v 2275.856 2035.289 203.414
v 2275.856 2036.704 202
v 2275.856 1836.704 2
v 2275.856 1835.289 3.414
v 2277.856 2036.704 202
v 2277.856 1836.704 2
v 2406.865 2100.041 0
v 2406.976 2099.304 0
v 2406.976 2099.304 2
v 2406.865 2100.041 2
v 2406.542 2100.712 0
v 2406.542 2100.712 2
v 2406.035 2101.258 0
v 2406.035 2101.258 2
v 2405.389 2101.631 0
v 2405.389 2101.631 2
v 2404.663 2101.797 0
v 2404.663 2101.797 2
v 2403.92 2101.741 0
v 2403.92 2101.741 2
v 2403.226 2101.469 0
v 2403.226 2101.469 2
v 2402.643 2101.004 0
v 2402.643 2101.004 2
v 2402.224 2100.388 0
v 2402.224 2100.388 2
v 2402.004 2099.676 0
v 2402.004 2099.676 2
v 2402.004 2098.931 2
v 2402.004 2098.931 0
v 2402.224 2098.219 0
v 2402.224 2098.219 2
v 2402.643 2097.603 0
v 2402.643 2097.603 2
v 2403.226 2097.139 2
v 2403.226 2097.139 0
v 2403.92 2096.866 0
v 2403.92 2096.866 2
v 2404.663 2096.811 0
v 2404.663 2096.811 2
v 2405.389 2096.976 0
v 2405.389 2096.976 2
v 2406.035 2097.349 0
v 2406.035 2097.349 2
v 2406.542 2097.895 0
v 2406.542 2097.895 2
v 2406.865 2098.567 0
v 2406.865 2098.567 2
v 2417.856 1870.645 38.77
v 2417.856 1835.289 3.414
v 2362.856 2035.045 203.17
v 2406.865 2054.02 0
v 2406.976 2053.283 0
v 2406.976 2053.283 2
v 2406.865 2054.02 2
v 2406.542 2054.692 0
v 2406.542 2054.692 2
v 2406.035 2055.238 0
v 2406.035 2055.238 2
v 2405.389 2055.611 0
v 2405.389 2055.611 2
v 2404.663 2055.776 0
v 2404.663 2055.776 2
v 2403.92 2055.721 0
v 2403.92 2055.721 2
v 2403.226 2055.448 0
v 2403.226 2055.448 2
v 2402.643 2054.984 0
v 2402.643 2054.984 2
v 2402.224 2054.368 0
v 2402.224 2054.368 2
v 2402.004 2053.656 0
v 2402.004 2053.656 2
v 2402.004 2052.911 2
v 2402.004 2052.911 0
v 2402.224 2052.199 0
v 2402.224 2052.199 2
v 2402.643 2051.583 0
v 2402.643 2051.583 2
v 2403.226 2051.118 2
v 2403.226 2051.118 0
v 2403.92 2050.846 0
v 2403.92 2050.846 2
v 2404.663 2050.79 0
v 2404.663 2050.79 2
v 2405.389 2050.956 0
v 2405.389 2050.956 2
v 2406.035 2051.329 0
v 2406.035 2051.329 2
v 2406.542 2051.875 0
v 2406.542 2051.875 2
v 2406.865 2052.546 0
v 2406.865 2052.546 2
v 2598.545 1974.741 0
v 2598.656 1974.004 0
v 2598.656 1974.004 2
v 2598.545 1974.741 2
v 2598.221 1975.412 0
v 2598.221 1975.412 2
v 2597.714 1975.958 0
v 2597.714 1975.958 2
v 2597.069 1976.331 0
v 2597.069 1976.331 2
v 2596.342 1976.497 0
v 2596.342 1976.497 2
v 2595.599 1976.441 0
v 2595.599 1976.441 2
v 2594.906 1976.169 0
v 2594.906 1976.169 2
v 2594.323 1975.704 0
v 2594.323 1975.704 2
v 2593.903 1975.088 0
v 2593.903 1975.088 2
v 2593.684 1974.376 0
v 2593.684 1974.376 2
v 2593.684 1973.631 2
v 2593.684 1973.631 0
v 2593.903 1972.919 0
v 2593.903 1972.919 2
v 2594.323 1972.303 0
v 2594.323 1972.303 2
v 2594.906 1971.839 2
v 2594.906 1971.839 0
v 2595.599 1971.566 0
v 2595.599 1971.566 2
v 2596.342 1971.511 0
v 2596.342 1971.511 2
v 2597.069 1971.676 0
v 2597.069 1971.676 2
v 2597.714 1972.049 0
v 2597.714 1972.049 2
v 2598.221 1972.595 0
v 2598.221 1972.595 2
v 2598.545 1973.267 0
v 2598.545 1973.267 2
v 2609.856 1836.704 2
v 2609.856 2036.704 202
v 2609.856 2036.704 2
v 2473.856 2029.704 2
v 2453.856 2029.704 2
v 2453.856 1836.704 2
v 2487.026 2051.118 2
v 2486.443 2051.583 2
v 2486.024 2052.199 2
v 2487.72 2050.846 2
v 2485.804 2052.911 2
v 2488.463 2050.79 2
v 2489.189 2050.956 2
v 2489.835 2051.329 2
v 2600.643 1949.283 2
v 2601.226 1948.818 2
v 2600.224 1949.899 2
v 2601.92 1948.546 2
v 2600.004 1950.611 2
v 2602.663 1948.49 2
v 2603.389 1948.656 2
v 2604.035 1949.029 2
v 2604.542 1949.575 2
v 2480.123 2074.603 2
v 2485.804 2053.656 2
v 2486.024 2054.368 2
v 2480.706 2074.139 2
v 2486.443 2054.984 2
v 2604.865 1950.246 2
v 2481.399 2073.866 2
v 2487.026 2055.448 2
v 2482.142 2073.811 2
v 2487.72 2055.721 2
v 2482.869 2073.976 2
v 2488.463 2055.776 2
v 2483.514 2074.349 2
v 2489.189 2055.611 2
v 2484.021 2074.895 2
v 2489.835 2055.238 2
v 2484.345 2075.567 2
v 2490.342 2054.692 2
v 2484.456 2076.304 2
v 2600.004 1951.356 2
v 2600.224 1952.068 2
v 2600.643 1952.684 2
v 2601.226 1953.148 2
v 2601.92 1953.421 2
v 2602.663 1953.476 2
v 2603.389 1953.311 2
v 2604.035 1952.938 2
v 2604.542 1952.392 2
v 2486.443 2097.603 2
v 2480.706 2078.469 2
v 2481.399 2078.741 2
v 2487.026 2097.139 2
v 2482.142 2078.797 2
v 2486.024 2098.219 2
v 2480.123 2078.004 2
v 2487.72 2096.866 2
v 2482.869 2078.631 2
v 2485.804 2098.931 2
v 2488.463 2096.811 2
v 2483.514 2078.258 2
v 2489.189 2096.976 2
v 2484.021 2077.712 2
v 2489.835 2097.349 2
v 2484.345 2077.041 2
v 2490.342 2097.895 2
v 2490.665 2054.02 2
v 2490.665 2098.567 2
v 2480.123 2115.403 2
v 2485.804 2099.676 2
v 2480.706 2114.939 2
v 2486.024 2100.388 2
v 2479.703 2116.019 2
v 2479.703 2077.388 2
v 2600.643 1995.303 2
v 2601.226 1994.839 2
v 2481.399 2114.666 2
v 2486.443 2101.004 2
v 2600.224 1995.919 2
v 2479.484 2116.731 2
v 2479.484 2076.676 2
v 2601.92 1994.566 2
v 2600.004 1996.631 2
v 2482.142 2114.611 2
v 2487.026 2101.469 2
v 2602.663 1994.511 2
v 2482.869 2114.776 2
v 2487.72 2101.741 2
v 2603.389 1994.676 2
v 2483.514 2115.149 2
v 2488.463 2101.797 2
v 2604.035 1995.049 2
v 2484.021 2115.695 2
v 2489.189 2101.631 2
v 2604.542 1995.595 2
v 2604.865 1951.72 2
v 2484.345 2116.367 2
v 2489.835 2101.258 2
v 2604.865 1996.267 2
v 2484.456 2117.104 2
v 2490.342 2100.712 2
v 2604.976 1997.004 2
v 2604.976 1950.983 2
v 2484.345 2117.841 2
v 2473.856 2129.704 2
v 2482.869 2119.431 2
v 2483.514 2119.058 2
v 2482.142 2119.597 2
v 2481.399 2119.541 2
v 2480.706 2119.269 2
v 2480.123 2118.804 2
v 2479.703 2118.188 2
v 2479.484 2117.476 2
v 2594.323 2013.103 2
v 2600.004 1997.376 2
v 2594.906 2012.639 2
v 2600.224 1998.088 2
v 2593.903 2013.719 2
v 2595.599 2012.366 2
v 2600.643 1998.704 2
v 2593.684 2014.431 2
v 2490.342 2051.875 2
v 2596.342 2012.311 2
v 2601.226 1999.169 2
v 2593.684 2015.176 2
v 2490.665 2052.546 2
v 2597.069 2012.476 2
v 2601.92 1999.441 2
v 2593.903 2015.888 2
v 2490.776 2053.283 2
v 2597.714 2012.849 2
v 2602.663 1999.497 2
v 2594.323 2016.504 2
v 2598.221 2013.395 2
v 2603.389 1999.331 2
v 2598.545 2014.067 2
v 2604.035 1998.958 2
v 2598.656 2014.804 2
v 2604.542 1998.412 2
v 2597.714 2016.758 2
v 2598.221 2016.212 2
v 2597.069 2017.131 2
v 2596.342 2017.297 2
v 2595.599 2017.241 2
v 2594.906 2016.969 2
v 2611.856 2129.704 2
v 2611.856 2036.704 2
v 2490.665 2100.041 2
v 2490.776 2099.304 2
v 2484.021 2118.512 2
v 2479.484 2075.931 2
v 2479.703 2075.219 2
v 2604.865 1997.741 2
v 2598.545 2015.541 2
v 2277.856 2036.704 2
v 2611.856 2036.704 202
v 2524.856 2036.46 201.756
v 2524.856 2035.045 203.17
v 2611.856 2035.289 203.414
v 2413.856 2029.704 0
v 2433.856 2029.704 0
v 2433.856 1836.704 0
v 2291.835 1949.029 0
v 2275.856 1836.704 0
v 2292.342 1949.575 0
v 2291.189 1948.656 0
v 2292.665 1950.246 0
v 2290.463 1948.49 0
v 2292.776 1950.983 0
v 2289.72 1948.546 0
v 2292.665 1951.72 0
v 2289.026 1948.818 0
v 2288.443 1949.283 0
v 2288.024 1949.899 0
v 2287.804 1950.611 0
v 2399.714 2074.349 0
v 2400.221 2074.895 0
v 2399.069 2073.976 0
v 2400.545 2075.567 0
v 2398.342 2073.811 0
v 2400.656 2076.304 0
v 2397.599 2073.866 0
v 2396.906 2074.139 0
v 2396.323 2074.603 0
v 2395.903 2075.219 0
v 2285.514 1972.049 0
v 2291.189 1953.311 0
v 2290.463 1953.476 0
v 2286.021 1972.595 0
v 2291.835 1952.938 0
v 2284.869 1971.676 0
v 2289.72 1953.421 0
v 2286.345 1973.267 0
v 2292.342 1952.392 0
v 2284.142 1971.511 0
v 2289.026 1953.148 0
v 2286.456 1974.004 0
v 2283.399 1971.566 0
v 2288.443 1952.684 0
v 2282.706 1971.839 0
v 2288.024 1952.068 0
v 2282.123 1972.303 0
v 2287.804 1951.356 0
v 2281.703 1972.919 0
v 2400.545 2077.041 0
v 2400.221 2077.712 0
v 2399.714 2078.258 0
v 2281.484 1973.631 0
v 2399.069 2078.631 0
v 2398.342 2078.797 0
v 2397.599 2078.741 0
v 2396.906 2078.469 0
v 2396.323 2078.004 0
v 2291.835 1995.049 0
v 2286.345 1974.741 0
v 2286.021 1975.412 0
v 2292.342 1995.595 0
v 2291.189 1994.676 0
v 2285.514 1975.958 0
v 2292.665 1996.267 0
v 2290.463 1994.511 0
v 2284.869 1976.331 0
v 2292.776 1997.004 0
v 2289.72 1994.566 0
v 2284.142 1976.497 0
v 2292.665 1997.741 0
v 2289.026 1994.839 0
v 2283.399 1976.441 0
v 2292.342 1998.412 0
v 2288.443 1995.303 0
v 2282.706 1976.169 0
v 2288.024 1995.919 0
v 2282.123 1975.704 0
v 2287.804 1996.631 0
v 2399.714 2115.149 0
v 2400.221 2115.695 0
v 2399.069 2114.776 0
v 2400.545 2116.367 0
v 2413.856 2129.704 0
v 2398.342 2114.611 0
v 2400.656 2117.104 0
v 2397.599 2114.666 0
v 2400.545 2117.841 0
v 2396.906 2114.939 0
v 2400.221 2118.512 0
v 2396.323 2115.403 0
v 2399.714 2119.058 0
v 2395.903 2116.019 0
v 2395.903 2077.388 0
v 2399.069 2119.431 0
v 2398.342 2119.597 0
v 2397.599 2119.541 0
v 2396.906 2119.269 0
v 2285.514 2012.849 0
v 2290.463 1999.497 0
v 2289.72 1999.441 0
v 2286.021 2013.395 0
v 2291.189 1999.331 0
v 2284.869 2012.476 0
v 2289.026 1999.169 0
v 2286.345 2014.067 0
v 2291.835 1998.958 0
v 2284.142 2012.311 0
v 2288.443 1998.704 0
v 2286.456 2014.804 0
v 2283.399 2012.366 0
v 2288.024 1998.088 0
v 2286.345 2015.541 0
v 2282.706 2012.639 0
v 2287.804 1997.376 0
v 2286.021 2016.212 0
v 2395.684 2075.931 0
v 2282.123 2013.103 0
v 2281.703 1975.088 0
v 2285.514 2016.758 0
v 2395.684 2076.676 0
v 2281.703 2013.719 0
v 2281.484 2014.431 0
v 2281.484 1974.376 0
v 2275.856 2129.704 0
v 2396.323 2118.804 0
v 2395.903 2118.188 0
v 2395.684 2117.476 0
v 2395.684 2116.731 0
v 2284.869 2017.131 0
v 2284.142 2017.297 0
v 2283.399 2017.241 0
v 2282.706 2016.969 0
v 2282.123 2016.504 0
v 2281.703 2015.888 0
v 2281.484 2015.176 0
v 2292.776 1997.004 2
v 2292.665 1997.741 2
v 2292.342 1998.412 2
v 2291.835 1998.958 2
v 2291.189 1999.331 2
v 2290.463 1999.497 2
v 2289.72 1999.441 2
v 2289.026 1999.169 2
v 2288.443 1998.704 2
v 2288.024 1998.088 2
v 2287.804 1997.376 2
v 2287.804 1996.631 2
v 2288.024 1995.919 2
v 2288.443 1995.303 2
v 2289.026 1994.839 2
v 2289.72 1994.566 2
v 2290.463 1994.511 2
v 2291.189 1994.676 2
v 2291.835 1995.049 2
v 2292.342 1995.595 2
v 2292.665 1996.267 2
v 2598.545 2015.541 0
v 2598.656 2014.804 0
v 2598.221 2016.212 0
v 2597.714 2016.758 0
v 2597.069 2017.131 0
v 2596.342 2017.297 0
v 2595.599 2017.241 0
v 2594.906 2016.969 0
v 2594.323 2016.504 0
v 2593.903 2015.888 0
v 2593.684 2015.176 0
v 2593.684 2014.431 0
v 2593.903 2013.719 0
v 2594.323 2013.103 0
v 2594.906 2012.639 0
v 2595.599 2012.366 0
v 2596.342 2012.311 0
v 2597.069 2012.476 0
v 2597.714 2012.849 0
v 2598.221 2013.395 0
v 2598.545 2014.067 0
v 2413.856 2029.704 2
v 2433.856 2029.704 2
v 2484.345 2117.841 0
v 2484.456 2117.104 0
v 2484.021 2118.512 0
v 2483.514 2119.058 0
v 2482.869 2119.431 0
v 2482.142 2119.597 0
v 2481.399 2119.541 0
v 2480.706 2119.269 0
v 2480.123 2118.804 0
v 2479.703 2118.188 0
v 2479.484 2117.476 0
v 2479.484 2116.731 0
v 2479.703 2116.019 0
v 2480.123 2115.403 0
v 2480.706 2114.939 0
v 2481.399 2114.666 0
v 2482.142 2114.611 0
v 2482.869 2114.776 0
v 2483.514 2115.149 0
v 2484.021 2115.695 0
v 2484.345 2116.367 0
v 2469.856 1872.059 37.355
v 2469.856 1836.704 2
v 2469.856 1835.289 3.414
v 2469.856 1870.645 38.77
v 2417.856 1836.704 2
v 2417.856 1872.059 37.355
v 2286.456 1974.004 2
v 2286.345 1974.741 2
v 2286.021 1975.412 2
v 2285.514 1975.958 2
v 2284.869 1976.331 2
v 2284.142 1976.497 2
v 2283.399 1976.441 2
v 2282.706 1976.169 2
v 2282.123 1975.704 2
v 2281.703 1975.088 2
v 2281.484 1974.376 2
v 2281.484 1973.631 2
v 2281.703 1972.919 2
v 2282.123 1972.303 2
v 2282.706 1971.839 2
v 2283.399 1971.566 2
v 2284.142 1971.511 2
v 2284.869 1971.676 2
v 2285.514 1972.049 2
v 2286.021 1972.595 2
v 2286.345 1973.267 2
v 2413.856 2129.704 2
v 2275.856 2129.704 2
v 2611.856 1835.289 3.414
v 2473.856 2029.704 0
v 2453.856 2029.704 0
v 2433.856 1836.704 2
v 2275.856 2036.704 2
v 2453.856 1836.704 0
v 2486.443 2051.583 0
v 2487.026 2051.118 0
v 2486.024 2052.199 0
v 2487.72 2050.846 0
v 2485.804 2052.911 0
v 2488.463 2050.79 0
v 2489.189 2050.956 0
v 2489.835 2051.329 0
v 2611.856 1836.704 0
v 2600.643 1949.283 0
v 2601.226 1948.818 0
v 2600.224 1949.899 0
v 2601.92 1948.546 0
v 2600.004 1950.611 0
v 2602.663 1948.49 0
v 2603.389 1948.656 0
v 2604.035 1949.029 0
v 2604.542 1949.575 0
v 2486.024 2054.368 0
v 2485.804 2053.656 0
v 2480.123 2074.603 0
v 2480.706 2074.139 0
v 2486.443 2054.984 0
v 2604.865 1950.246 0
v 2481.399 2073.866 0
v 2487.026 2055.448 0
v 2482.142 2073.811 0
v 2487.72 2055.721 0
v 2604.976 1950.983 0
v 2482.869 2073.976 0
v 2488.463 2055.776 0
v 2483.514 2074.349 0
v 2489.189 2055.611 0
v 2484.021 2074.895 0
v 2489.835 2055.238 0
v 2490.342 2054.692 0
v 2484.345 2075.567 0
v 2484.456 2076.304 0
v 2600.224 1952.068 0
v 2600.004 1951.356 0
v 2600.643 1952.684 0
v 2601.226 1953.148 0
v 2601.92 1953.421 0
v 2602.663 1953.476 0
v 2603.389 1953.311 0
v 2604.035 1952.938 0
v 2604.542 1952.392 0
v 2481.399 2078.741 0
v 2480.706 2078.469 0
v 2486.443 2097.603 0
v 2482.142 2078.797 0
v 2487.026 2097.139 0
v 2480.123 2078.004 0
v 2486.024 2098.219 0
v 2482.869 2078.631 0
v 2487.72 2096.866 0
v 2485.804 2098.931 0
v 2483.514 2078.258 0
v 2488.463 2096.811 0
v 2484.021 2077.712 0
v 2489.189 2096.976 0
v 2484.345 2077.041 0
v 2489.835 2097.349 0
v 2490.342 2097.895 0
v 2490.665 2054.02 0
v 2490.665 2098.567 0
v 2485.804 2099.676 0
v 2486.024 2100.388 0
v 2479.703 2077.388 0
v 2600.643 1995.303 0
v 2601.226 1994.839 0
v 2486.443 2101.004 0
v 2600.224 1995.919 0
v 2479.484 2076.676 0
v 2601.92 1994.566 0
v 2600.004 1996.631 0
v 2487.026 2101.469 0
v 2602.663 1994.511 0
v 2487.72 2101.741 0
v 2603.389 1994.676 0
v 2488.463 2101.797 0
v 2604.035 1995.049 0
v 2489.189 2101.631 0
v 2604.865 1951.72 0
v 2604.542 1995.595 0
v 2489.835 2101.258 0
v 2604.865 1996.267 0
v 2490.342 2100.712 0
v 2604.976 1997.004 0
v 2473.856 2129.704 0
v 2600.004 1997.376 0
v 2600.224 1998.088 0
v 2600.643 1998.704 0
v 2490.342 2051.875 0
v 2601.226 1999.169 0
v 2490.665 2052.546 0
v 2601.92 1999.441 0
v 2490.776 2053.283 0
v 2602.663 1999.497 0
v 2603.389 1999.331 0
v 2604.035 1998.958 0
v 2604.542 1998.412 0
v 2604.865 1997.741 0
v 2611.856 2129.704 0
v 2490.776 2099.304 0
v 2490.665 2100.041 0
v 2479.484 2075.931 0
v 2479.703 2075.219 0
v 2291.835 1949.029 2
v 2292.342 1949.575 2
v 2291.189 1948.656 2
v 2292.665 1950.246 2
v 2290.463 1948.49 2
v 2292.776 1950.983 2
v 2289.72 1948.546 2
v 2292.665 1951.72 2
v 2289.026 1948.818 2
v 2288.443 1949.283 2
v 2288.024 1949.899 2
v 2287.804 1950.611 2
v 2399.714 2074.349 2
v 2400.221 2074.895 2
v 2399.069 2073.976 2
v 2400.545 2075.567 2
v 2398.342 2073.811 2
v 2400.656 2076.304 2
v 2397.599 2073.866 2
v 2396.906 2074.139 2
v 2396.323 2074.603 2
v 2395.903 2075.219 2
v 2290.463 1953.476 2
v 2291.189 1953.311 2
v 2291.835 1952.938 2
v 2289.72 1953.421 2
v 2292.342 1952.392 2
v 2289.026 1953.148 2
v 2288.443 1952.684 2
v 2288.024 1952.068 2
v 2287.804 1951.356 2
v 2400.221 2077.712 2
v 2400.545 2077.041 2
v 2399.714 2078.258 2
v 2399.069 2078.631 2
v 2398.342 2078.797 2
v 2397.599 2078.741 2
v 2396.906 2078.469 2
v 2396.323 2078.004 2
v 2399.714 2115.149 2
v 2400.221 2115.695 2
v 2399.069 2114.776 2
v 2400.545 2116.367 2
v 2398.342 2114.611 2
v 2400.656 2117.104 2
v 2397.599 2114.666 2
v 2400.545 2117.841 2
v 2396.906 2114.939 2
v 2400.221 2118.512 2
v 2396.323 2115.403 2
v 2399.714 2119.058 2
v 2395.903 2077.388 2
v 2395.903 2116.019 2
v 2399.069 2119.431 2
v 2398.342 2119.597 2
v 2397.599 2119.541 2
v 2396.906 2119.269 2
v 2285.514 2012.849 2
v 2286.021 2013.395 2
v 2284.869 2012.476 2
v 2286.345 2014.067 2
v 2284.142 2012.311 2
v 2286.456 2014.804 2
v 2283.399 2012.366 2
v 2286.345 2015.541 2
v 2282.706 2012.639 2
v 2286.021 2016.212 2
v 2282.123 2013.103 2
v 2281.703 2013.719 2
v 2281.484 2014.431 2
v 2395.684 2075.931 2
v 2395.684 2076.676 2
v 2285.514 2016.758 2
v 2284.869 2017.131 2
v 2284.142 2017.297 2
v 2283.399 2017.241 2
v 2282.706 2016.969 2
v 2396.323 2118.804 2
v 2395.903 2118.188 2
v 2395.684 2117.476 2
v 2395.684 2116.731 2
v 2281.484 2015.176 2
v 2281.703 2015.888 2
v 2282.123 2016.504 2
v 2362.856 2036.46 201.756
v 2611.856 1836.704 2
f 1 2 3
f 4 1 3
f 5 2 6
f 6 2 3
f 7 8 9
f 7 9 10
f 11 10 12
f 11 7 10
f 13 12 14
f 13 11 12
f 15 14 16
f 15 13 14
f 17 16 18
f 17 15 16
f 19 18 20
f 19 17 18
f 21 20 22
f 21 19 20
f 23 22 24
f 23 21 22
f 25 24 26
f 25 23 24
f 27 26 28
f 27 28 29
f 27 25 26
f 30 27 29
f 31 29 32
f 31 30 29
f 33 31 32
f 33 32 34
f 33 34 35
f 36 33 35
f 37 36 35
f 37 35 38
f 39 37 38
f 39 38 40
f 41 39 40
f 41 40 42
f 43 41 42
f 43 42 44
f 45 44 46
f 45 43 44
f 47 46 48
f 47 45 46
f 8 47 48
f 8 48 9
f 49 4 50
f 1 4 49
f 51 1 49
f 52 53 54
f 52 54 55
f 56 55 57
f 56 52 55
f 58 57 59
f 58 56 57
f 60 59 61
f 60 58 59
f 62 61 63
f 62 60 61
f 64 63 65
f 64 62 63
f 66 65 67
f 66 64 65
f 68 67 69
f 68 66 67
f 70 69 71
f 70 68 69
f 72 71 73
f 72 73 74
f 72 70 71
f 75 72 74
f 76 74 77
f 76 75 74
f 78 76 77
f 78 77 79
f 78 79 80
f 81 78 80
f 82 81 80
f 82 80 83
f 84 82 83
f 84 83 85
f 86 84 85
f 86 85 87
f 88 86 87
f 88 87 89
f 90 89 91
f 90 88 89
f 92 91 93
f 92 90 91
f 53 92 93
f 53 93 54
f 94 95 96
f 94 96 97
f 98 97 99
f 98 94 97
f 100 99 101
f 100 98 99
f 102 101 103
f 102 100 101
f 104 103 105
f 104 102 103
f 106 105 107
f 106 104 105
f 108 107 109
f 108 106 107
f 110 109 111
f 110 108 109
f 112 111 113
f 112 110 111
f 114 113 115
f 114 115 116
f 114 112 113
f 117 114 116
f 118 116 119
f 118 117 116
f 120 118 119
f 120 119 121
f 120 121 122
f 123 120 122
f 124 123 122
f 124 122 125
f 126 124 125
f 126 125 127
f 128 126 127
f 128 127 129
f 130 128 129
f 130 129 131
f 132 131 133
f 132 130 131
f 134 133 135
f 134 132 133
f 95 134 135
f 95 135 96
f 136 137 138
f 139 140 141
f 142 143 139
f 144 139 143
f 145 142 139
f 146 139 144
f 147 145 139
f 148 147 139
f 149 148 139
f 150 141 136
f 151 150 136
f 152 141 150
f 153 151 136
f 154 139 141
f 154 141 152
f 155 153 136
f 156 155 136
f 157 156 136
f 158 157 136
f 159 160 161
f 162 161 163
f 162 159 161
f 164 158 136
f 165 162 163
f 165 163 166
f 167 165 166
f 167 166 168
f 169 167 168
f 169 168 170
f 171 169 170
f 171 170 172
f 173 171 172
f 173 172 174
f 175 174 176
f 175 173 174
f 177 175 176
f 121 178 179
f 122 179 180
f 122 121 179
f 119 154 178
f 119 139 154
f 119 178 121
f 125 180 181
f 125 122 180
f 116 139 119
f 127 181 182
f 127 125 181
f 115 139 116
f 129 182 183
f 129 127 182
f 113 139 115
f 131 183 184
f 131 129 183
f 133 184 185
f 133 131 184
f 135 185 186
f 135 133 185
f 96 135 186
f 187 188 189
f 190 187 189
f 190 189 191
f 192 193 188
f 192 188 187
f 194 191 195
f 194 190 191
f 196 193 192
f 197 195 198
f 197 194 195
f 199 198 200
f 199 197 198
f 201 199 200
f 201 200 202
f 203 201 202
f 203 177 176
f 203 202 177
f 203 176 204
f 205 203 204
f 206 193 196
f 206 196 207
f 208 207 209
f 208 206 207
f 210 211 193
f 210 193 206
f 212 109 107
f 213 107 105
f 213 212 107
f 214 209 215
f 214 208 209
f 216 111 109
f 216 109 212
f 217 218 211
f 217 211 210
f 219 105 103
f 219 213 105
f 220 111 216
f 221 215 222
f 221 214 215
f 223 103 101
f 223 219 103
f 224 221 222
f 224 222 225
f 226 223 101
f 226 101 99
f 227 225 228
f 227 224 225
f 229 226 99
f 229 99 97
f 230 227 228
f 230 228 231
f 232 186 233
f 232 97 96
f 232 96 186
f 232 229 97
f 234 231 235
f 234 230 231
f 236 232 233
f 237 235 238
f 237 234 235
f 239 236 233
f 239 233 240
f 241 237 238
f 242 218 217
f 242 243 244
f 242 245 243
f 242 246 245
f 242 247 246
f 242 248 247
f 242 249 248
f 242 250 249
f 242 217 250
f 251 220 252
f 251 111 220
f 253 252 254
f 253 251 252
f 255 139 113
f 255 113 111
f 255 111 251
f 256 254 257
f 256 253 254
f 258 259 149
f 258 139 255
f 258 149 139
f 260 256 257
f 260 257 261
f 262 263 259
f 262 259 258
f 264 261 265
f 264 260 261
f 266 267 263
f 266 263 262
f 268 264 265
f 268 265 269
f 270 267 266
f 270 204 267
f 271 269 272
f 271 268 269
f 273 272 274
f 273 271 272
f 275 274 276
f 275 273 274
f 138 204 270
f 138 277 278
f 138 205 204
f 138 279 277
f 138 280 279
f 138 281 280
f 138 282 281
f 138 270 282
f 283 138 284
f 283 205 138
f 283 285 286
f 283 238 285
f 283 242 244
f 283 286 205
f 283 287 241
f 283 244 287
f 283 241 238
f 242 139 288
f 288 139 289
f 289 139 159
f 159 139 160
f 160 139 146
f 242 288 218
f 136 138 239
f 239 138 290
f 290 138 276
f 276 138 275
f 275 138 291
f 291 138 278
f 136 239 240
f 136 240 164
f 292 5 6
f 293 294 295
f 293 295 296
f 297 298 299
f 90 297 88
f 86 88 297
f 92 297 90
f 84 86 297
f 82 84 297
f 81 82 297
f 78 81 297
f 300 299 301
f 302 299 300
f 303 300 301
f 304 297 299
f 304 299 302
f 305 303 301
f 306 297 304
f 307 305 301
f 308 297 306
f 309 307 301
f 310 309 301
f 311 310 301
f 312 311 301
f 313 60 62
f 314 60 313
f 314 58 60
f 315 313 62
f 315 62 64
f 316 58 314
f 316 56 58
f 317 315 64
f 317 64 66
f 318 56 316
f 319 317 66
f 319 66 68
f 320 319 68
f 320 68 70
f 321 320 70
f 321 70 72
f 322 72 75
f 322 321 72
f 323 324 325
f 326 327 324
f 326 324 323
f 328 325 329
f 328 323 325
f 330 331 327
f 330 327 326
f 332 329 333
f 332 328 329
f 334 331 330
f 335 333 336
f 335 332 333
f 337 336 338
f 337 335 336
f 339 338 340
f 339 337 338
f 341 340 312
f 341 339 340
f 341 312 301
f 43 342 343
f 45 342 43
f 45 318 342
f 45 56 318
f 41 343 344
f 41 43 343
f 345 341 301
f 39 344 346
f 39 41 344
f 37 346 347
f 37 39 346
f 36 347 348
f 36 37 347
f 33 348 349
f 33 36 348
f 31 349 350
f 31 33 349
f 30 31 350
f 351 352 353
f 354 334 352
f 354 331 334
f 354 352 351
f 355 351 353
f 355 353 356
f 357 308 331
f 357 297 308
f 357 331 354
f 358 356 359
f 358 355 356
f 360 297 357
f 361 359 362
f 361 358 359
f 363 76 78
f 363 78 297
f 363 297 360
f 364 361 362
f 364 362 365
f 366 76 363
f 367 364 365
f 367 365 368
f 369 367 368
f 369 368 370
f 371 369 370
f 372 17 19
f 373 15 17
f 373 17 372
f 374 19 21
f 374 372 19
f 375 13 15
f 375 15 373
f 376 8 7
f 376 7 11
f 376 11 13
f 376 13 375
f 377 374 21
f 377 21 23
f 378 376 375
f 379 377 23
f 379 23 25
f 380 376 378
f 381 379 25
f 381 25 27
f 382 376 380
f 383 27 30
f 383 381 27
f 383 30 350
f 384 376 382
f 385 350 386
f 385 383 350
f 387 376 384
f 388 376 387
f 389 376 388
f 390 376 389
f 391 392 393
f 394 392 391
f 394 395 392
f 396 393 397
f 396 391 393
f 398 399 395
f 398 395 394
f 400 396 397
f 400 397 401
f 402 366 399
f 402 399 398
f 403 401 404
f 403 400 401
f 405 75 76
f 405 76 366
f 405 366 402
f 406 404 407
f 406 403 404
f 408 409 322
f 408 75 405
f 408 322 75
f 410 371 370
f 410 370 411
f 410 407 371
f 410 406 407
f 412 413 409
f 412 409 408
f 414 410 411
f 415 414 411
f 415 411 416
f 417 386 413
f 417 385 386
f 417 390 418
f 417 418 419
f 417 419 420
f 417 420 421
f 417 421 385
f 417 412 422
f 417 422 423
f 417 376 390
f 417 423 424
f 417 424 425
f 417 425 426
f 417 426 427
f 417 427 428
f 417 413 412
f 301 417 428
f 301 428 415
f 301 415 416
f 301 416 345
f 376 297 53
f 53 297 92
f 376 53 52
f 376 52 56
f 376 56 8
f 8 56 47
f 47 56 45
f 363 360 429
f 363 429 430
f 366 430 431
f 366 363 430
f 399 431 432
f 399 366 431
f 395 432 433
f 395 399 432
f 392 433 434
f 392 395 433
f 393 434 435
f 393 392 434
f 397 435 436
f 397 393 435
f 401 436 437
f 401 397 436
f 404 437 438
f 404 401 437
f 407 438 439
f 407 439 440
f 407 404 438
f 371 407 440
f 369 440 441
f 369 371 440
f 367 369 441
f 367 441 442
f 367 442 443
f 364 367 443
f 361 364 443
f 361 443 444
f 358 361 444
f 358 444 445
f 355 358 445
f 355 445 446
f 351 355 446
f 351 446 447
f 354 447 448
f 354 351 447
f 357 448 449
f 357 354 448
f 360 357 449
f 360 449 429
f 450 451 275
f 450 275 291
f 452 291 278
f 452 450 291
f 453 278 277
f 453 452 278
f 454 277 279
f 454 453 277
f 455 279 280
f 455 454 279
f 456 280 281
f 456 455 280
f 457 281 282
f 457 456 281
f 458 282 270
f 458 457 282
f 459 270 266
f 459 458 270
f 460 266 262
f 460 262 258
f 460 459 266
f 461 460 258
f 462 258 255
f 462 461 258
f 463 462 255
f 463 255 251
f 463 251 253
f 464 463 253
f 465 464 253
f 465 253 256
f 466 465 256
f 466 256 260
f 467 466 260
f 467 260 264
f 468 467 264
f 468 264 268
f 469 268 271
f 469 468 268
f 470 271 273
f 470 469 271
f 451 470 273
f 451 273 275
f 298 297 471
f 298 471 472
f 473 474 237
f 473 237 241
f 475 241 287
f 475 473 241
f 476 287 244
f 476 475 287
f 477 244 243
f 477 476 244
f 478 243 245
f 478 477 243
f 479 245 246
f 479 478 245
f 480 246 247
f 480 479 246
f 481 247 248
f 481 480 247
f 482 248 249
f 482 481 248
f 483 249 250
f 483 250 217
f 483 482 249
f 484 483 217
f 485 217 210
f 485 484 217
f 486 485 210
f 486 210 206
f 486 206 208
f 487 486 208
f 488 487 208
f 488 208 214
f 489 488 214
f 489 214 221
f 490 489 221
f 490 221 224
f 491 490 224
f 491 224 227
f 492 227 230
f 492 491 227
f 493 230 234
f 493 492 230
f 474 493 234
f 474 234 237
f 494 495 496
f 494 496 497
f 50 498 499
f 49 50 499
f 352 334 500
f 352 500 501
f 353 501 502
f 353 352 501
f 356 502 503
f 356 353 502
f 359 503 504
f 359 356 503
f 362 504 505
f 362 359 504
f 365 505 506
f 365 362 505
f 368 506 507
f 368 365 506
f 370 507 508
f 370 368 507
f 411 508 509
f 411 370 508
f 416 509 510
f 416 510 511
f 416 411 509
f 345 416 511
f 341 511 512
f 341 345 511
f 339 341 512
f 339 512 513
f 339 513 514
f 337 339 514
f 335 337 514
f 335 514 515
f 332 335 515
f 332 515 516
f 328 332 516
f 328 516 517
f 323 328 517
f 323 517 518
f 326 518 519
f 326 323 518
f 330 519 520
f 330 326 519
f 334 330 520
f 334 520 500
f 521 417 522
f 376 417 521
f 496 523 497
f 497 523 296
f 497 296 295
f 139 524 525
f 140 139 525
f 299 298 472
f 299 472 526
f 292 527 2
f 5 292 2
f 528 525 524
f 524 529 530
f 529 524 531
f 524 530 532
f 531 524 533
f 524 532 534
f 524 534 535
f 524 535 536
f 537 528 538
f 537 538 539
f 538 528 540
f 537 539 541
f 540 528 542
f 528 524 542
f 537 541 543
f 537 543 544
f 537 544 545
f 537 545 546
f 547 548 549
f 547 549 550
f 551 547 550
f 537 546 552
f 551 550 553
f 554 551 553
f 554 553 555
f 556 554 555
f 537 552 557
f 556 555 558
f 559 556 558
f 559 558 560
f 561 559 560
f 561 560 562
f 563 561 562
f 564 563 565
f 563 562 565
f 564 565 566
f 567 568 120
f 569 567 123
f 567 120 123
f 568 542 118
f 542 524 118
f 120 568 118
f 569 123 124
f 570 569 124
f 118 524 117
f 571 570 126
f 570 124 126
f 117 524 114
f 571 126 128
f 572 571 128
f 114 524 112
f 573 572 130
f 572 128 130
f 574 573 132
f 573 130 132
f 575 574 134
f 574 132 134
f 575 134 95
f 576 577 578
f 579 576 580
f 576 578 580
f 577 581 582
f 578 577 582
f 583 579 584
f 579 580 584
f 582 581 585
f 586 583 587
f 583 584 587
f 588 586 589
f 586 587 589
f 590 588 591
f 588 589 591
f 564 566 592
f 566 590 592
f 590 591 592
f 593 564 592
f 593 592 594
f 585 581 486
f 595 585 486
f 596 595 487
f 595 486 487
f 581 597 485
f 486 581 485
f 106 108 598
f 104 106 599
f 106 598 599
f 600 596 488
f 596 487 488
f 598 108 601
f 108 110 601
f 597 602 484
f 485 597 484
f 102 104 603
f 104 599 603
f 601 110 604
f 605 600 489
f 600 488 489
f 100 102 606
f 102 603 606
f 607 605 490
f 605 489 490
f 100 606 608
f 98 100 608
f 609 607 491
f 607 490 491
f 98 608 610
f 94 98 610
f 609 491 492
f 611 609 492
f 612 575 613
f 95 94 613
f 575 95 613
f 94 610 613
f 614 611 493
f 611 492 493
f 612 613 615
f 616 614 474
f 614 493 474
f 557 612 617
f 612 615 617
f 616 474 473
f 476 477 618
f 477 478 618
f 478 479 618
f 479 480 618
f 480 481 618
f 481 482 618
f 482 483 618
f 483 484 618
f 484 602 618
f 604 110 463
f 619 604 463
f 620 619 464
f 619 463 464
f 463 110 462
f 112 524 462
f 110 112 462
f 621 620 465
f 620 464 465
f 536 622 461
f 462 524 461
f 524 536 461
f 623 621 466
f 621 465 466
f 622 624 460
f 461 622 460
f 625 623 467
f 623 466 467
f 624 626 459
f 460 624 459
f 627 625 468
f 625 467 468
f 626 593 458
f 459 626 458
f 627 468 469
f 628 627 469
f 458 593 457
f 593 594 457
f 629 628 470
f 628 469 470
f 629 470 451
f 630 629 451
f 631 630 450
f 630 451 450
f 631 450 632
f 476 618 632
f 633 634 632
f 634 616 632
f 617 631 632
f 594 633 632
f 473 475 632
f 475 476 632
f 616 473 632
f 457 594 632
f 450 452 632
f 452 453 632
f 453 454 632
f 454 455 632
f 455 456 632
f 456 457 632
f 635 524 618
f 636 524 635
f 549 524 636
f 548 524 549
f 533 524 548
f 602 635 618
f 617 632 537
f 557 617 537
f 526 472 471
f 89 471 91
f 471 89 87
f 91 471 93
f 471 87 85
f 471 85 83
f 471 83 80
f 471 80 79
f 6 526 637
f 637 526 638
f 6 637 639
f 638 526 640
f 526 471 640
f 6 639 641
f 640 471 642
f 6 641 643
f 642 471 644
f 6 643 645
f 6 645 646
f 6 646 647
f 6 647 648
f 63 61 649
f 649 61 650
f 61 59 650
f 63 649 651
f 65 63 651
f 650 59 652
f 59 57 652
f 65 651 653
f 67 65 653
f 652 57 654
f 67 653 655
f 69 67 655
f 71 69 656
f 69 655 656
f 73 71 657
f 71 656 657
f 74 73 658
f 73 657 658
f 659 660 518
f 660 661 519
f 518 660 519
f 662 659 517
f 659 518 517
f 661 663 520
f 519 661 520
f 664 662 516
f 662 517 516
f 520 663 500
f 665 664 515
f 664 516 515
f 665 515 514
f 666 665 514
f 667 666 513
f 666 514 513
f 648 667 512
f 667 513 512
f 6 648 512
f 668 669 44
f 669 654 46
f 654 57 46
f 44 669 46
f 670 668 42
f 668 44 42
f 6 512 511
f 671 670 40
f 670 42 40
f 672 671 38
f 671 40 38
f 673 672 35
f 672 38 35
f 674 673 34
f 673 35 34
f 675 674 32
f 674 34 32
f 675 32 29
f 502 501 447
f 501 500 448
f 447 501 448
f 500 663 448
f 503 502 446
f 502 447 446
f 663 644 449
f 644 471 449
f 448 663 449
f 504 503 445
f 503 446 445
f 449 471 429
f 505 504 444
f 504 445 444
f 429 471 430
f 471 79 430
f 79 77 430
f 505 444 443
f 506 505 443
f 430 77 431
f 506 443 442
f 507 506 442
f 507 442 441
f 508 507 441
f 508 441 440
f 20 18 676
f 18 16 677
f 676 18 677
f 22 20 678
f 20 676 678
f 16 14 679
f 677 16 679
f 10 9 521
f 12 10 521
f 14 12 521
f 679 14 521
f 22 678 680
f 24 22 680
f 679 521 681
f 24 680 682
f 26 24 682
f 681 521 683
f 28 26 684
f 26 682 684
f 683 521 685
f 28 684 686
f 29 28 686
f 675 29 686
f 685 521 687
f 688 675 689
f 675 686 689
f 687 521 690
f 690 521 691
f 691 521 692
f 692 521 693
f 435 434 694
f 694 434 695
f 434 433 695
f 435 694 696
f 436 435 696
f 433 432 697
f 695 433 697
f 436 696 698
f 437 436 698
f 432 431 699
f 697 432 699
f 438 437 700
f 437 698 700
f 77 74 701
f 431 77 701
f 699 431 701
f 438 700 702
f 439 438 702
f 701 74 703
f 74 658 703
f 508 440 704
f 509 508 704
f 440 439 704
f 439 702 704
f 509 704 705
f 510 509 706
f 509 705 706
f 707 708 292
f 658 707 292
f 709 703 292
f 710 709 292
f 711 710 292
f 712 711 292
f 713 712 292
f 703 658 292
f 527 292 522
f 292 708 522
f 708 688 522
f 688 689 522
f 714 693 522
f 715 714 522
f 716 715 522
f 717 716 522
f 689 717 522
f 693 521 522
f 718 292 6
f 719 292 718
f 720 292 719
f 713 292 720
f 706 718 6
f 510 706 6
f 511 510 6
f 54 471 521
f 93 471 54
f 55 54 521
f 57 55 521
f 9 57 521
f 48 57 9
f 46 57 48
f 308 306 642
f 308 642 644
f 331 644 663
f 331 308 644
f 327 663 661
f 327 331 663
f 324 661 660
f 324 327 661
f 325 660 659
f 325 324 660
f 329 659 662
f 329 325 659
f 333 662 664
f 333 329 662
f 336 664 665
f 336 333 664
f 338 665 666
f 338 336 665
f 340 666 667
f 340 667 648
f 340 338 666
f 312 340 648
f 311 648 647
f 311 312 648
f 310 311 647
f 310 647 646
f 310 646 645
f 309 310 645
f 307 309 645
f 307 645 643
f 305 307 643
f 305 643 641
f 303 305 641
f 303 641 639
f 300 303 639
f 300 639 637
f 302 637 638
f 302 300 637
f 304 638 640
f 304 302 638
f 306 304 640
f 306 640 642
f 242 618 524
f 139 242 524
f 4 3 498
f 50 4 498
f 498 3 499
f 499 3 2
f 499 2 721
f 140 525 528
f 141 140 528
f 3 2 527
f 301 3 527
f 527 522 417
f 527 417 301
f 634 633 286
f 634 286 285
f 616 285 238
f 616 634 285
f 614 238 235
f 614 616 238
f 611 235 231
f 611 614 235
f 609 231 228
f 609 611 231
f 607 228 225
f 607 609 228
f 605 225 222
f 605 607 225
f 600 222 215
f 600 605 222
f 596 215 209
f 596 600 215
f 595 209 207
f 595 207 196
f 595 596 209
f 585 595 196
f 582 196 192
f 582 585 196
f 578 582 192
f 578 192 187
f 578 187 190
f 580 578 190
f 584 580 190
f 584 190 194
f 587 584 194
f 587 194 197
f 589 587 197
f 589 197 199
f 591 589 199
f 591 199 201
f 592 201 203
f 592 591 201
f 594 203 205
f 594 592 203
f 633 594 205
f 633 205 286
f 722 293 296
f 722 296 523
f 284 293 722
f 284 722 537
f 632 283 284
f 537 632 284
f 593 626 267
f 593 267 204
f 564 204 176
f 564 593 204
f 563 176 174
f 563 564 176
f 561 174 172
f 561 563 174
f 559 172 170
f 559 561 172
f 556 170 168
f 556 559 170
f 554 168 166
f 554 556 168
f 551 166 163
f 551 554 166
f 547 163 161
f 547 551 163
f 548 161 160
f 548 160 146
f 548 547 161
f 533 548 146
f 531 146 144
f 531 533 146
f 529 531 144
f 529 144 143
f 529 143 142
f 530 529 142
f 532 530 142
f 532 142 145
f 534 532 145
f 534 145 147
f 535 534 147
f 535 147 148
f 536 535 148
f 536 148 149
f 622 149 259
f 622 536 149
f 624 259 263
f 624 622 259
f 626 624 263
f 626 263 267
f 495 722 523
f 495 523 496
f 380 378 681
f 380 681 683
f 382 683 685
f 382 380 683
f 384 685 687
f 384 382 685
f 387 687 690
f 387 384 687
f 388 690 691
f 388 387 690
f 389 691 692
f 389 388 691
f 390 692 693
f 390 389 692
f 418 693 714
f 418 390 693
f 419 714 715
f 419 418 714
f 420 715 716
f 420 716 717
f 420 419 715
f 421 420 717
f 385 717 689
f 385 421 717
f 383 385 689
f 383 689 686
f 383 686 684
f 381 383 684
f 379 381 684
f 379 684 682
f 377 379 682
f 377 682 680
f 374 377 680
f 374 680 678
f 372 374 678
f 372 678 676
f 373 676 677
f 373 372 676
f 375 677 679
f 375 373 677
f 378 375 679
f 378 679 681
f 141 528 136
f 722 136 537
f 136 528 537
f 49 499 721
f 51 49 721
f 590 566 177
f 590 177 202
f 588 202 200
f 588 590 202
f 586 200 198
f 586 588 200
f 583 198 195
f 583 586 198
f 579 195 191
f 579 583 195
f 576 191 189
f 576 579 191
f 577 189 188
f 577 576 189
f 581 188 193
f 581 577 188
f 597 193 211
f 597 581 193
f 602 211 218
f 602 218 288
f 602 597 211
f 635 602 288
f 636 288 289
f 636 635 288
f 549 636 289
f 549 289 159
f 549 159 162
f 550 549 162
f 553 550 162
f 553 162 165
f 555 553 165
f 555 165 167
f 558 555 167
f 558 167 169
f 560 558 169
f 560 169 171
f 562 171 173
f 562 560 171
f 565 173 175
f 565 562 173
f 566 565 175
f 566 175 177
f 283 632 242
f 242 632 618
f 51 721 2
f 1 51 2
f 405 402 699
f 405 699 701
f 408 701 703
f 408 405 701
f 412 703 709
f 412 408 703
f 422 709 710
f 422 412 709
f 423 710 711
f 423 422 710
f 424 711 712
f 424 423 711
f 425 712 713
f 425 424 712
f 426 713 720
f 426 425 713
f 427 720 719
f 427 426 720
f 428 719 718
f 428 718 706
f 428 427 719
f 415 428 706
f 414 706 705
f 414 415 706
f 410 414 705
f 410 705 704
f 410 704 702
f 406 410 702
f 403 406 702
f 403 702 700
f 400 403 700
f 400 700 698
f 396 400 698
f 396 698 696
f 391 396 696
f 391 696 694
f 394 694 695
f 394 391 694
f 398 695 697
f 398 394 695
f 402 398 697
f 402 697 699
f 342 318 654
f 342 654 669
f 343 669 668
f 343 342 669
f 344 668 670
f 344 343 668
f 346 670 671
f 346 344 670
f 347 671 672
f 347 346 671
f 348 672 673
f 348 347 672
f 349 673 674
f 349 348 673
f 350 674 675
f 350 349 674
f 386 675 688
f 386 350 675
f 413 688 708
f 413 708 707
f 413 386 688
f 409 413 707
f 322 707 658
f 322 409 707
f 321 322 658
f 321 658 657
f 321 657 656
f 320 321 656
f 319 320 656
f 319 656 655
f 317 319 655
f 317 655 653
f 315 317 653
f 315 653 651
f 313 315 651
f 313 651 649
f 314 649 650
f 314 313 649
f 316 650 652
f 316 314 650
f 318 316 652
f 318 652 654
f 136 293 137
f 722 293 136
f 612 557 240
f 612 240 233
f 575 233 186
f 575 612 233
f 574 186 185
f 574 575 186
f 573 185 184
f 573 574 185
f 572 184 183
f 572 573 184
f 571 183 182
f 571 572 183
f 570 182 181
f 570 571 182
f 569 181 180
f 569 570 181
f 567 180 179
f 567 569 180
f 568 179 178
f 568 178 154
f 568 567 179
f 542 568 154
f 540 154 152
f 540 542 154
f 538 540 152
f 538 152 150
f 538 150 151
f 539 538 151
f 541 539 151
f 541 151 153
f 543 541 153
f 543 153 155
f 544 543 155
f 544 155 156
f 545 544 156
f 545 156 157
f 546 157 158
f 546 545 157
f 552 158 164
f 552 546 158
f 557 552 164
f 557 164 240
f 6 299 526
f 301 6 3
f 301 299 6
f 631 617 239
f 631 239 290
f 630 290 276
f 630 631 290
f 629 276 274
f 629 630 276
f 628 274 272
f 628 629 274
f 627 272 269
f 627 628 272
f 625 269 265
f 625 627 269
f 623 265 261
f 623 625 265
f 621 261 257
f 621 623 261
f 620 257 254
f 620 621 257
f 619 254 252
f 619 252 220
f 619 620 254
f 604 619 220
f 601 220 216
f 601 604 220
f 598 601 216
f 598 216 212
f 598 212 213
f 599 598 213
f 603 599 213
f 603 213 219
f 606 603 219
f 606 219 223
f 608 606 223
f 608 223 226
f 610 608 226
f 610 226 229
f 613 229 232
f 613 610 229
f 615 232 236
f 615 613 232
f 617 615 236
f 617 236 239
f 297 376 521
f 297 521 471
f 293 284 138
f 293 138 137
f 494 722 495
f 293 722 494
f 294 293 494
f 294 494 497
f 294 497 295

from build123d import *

# Parameters (mm, degrees)
SKETCH_1_R        = 2.5
EXTRUDE_2_DEPTH   = 2
EXTRUDE_2_2_DEPTH = 2
EXTRUDE_5_DEPTH   = 2
EXTRUDE_6_DEPTH   = 2
EXTRUDE_7_DEPTH   = 2
EXTRUDE_7_2_DEPTH = 2


with BuildPart() as part:
    # 草图1 → 凸台-拉伸2 (new body)
    with BuildSketch(Plane.XY):
        Polygon((2433.85566646, 2029.703654003), (2433.85566646, 1836.703654003), (2275.85566646, 1836.703654003), (2275.85566646, 2129.703654003), (2413.85566646, 2129.703654003), (2413.85566646, 2029.703654003), align=None)
        with Locations((2404.475937528, 2099.303654003)):
            Circle(SKETCH_1_R, mode=Mode.SUBTRACT)
        with Locations((2404.475937528, 2053.283382936)):
            Circle(SKETCH_1_R, mode=Mode.SUBTRACT)
        with Locations((2398.15566646, 2076.303654003)):
            Circle(SKETCH_1_R, mode=Mode.SUBTRACT)
        with Locations((2398.15566646, 2117.103654003)):
            Circle(SKETCH_1_R, mode=Mode.SUBTRACT)
        with Locations((2290.275937528, 1997.003654003)):
            Circle(SKETCH_1_R, mode=Mode.SUBTRACT)
        with Locations((2290.275937528, 1950.983382936)):
            Circle(SKETCH_1_R, mode=Mode.SUBTRACT)
        with Locations((2283.95566646, 1974.003654003)):
            Circle(SKETCH_1_R, mode=Mode.SUBTRACT)
        with Locations((2283.95566646, 2014.803654003)):
            Circle(SKETCH_1_R, mode=Mode.SUBTRACT)
    extrude(amount=EXTRUDE_2_DEPTH)

    # 草图6 → 凸台-拉伸6 (add)
    with BuildSketch(Plane.ZY.offset(-2275.85566646)):
        Polygon((2, 1836.703654003), (2, 2036.703654003), (202, 2036.703654003), align=None)
    extrude(amount=-EXTRUDE_6_DEPTH)


with BuildPart() as body_2:
    # 草图1 → Extrude 2 2 (new body)
    with BuildSketch(Plane.XY):
        Polygon((2473.85566646, 2129.703654003), (2473.85566646, 2029.703654003), (2453.85566646, 2029.703654003), (2453.85566646, 1836.703654003), (2611.85566646, 1836.703654003), (2611.85566646, 2129.703654003), align=None)
        with Locations((2488.275937528, 2099.303654003)):
            Circle(SKETCH_1_R, mode=Mode.SUBTRACT)
        with Locations((2488.275937528, 2053.283382936)):
            Circle(SKETCH_1_R, mode=Mode.SUBTRACT)
        with Locations((2481.95566646, 2076.303654003)):
            Circle(SKETCH_1_R, mode=Mode.SUBTRACT)
        with Locations((2481.95566646, 2117.103654003)):
            Circle(SKETCH_1_R, mode=Mode.SUBTRACT)
        with Locations((2602.475937528, 1997.003654003)):
            Circle(SKETCH_1_R, mode=Mode.SUBTRACT)
        with Locations((2602.475937528, 1950.983382936)):
            Circle(SKETCH_1_R, mode=Mode.SUBTRACT)
        with Locations((2596.15566646, 1974.003654003)):
            Circle(SKETCH_1_R, mode=Mode.SUBTRACT)
        with Locations((2596.15566646, 2014.803654003)):
            Circle(SKETCH_1_R, mode=Mode.SUBTRACT)
    extrude(amount=EXTRUDE_2_2_DEPTH)

    # 草图5 → 凸台-拉伸5 (add)
    with BuildSketch(Plane(origin=(2611.85566646, 0, 0), x_dir=(0, 0, -1), z_dir=(1, 0, 0))):
        Polygon((-2, 1836.703654003), (-2, 2036.703654003), (-202, 2036.703654003), align=None)
    extrude(amount=-EXTRUDE_5_DEPTH)


with BuildPart() as body_3:
    # 草图7 → 凸台-拉伸7 (new body)
    with BuildSketch(Plane(origin=(0, 917.351827001, -917.351827001), x_dir=(1, 0, 0), z_dir=(0, -0.7071067811865472, 0.7071067811865479))):
        Polygon((2417.85566646, 1300.159822338), (2417.85566646, 1350.159822338), (2362.85566646, 1582.657469875), (2275.85566646, 1583.002534812), (2275.85566646, 1300.159822338), align=None)
    extrude(amount=EXTRUDE_7_DEPTH)


with BuildPart() as body_4:
    # 草图7 → Extrude 7 2 (new body)
    with BuildSketch(Plane(origin=(0, 917.351827001, -917.351827001), x_dir=(1, 0, 0), z_dir=(0, -0.7071067811865472, 0.7071067811865479))):
        Polygon((2469.85566646, 1300.159822338), (2469.85566646, 1350.159822338), (2524.85566646, 1582.657469875), (2611.85566646, 1583.002534812), (2611.85566646, 1300.159822338), align=None)
    extrude(amount=EXTRUDE_7_2_DEPTH)


solid = Compound([part.part, body_2.part, body_3.part, body_4.part])
